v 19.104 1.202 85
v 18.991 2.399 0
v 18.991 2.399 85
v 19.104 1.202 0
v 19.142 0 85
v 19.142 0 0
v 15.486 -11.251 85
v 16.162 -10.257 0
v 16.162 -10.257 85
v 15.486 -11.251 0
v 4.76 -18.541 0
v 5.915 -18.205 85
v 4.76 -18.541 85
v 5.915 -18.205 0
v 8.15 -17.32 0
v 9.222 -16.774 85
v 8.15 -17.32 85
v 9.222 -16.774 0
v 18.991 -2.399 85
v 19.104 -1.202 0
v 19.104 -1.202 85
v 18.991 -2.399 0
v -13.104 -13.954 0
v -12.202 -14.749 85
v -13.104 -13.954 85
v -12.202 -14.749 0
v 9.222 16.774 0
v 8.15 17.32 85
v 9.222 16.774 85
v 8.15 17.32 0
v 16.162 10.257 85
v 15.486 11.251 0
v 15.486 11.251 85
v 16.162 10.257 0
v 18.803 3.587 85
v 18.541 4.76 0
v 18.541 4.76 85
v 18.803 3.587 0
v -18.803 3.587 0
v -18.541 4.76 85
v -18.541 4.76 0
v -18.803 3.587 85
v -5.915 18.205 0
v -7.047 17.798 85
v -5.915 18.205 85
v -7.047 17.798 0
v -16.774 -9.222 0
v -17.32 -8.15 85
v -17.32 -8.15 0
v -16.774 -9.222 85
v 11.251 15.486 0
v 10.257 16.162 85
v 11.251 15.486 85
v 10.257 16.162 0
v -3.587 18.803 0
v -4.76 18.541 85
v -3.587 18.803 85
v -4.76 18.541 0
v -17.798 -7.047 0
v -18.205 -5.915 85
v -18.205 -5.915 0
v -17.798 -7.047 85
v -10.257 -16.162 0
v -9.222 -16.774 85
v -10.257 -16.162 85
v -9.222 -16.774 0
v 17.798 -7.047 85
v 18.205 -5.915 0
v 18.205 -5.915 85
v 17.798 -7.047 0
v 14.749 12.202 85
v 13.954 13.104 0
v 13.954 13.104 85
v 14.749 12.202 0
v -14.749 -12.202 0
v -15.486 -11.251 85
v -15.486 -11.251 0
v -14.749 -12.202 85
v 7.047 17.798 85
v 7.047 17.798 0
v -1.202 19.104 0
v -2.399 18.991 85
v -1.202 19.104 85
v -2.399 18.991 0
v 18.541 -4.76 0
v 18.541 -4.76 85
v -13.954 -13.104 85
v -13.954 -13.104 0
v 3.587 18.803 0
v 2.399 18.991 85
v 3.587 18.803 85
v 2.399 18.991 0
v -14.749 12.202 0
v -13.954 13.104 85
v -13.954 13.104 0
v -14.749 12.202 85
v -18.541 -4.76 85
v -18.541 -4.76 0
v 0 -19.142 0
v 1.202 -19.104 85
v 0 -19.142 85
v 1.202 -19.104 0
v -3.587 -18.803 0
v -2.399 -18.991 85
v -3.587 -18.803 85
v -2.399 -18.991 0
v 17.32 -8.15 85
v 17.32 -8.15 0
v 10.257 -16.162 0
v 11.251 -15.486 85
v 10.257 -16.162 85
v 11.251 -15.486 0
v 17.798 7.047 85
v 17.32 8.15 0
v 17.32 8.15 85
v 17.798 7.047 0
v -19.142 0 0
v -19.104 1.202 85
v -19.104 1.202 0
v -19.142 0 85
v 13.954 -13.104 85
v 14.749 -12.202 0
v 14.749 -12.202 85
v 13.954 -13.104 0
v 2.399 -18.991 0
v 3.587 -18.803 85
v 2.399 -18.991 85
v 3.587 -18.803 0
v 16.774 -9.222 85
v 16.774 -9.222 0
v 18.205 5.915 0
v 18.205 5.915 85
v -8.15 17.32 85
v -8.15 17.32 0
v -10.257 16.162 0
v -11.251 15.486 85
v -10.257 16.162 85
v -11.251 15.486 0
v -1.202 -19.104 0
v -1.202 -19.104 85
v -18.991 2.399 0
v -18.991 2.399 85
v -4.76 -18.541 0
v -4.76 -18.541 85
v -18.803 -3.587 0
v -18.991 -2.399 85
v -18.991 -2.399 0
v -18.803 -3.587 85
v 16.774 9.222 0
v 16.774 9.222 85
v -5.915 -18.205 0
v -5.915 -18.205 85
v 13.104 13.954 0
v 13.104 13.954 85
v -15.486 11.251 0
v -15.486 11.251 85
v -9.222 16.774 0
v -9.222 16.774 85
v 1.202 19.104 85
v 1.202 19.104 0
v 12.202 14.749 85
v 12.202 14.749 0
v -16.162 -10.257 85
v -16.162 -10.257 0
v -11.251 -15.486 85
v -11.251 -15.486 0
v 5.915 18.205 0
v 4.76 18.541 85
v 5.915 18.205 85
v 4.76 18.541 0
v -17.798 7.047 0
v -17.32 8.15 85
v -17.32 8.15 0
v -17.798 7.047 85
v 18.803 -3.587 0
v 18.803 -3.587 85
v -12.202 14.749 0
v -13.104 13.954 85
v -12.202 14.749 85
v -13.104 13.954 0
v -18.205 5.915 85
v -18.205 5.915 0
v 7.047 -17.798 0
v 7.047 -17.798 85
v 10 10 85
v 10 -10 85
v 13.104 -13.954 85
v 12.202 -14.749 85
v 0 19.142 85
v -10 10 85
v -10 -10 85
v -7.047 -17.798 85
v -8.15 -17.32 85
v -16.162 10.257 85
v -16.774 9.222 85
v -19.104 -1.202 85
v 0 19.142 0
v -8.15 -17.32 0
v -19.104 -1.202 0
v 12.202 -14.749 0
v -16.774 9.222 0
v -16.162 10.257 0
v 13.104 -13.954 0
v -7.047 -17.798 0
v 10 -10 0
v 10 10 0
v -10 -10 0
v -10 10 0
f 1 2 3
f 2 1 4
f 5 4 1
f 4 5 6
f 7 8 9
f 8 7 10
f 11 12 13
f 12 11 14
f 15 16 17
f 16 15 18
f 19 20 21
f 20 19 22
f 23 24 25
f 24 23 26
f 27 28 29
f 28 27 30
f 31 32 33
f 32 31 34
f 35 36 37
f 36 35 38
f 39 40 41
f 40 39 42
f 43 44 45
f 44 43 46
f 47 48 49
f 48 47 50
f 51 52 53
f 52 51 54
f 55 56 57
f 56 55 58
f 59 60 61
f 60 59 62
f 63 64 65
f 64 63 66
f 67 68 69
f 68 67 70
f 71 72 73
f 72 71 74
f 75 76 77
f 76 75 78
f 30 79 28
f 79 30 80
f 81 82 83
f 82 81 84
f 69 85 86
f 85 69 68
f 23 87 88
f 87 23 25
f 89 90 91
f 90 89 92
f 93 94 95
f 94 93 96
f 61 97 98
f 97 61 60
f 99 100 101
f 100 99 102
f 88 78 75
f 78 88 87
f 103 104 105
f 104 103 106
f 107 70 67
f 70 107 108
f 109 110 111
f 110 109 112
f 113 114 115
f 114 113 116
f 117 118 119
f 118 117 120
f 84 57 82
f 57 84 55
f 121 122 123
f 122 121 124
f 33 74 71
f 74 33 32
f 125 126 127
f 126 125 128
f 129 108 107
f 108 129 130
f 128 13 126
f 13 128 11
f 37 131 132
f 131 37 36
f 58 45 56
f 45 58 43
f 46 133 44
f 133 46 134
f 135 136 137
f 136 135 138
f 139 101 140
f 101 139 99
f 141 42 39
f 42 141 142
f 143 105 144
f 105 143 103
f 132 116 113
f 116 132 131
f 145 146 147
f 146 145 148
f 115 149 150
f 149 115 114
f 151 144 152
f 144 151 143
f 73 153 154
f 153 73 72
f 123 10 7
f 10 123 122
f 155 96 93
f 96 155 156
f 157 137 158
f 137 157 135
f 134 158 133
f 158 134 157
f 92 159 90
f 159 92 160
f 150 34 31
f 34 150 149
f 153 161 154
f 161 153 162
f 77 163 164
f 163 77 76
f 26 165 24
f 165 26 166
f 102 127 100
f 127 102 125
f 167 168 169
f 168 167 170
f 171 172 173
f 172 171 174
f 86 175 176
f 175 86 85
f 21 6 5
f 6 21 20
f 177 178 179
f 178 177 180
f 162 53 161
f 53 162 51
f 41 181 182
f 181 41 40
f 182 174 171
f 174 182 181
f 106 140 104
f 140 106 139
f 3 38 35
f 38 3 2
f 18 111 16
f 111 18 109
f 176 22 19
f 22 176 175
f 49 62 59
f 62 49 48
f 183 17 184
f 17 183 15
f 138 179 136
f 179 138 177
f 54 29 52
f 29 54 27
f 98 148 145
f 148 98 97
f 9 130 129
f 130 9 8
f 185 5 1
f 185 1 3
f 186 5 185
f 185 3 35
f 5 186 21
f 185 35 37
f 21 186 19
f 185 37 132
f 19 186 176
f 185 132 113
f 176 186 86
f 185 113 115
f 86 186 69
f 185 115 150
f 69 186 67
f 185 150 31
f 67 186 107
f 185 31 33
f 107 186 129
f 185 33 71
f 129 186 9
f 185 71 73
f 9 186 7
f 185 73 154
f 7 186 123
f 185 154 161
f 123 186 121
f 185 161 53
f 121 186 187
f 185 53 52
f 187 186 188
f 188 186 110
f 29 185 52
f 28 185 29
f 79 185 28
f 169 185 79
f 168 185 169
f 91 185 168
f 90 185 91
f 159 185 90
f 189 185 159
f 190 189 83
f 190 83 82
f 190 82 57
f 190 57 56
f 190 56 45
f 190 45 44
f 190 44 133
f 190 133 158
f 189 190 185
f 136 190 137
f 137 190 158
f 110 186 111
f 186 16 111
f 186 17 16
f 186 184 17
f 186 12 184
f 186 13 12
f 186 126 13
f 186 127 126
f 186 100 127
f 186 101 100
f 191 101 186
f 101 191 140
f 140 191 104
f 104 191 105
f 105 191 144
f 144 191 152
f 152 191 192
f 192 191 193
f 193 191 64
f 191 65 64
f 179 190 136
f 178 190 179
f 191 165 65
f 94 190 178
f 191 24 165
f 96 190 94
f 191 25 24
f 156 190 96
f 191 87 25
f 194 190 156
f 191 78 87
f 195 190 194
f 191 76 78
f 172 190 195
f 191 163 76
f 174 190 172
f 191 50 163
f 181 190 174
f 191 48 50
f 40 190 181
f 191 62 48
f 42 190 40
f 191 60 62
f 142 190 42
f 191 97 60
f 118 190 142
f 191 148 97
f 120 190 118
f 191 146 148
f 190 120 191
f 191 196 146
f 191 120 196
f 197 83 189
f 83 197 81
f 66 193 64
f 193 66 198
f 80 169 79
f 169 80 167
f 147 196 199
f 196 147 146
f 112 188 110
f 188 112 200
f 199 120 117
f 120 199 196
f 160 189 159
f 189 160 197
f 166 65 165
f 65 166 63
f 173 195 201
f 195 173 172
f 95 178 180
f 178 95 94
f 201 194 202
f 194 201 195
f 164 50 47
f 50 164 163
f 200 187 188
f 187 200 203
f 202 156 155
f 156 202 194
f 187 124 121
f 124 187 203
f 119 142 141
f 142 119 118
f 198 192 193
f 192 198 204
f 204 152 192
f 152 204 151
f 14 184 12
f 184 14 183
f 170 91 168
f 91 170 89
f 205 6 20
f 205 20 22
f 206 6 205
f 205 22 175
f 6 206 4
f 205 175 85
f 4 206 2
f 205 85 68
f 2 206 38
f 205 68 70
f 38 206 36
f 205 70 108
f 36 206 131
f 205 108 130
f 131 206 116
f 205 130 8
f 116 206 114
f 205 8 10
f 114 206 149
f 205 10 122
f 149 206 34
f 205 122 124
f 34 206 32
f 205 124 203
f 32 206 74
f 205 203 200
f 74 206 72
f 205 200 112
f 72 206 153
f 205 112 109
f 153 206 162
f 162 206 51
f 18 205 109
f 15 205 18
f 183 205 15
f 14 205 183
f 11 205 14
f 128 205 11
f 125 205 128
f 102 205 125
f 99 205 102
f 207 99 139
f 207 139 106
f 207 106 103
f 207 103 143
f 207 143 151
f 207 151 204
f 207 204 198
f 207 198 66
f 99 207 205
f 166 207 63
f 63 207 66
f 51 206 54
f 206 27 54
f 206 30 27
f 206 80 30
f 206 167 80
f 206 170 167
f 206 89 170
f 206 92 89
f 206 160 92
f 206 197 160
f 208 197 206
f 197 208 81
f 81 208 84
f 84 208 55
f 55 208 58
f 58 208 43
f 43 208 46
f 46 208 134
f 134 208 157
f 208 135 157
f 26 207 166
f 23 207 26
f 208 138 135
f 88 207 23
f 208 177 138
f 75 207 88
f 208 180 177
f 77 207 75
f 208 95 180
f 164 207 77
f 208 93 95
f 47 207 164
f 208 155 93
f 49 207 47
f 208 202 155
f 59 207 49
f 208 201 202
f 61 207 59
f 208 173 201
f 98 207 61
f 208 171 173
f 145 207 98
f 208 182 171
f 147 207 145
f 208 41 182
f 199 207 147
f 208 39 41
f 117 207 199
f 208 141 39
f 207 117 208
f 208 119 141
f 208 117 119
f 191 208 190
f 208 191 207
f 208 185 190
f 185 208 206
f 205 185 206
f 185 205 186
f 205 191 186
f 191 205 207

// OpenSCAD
$fn = 100;

cylinder_height = 85;

cutout_side = 20;

cylinder_radius = sqrt(2*pow(cutout_side,2))/2 + 5;

difference(){
	cylinder(cylinder_height, r=cylinder_radius);
	linear_extrude(cylinder_height)
		square(cutout_side,center=true);
}
